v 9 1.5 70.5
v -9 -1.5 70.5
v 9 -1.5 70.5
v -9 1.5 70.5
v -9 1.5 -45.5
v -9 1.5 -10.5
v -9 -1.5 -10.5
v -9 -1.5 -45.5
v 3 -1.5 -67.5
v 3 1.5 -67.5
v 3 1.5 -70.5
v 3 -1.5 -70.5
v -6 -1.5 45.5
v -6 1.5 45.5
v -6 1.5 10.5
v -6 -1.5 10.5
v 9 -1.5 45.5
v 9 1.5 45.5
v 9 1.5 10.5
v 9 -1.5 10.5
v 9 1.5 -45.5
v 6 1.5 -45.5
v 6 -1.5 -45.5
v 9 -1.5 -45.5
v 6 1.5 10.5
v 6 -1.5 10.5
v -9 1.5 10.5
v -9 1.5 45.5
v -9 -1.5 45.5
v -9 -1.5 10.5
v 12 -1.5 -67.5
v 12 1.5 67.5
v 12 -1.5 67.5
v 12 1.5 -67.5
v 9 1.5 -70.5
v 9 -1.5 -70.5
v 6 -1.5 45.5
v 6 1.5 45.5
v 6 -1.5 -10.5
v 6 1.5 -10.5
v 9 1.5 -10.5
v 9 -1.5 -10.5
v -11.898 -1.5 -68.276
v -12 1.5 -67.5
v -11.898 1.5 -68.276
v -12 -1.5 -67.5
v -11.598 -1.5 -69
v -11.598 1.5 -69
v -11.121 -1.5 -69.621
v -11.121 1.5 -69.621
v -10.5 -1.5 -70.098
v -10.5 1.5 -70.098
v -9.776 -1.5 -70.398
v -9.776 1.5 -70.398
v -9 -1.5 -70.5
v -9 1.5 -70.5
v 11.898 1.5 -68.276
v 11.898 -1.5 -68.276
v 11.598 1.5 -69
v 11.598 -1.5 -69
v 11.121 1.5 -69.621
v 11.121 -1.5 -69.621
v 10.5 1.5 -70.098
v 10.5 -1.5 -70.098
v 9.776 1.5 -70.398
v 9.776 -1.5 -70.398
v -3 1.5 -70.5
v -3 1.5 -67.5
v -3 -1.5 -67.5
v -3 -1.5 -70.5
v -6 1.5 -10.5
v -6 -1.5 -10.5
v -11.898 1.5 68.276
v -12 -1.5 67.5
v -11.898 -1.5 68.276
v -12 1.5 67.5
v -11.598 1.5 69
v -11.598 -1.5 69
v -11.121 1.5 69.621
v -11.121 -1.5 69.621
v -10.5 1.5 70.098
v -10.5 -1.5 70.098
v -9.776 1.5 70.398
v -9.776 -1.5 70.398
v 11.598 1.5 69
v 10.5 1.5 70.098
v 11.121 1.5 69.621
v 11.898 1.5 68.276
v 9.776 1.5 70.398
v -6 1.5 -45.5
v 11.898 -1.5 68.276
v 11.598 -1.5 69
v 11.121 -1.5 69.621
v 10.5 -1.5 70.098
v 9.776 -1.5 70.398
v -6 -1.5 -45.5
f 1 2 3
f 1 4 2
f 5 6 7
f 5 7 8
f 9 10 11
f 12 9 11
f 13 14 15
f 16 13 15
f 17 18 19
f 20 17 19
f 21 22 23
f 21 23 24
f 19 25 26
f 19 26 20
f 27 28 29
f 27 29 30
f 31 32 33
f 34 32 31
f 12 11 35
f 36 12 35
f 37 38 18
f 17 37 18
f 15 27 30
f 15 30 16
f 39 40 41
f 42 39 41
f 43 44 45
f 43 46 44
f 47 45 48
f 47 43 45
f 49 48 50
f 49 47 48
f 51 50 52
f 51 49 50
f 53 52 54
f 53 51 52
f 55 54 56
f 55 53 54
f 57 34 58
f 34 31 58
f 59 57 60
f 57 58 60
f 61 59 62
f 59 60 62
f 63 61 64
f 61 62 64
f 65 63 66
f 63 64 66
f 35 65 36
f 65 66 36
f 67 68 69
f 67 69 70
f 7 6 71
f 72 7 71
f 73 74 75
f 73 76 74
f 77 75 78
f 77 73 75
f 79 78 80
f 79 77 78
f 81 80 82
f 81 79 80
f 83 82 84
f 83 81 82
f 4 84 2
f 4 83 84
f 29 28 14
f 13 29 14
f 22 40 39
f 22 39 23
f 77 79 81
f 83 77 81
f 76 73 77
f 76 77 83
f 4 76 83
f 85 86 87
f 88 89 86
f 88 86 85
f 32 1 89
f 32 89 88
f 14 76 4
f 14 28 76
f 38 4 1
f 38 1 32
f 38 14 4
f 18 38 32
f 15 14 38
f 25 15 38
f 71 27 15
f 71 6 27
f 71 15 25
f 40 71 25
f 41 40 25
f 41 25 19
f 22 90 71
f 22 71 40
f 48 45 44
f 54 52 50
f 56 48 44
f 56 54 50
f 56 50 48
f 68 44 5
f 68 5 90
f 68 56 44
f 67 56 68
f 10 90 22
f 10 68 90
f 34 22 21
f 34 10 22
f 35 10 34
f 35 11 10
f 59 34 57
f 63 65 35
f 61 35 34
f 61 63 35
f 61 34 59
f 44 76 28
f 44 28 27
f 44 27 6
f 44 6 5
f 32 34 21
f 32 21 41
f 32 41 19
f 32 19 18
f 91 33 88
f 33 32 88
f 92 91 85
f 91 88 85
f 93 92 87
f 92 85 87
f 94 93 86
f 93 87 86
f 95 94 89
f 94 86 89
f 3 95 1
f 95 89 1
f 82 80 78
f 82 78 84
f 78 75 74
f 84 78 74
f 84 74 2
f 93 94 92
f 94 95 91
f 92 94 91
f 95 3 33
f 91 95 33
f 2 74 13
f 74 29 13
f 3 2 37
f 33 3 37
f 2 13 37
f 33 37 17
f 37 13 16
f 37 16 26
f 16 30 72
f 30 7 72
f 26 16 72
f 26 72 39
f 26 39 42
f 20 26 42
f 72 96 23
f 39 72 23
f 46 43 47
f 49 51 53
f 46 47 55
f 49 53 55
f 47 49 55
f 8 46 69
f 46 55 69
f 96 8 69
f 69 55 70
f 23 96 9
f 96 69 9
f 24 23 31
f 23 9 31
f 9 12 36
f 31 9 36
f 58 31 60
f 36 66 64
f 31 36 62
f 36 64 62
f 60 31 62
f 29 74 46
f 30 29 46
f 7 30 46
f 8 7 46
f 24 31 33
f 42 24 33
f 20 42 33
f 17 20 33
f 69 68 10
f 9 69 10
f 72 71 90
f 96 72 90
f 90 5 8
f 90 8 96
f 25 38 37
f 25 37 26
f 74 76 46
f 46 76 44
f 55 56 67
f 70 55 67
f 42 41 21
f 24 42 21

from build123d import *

# Parameters (mm, degrees)
SKETCH1_W               = 24
SKETCH1_H               = 141
BOSS_EXTRUDE1_DEPTH     = 1.5
SKETCH2_W               = 3
SKETCH2_H               = 35
CUT_EXTRUDE1_DEPTH      = 2.5
CUT_EXTRUDE1_DEPTH_BACK = 2.5
FILLET1_R               = 3
SKETCH3_W               = 6
SKETCH3_H               = 3
CUT_EXTRUDE2_DEPTH      = 2.5
CUT_EXTRUDE2_DEPTH_BACK = 2.5


with BuildPart() as part:
    # Sketch1 → Boss-Extrude1 (new body, symmetric)
    with BuildSketch(Plane(origin=(0, 0, 0), x_dir=(1, 0, 0), z_dir=(0, 1, 0))):
        Rectangle(SKETCH1_W, SKETCH1_H)
    extrude(amount=BOSS_EXTRUDE1_DEPTH, both=True)

    # Sketch2 → Cut-Extrude1 (cut, two sides)
    with BuildSketch(Plane(origin=(0, 0, 0), x_dir=(1, 0, 0), z_dir=(0, 1, 0))) as cut_extrude1_sk:
        with Locations((-7.5, 28)):
            Rectangle(SKETCH2_W, SKETCH2_H)
        with Locations((7.5, 28)):
            Rectangle(SKETCH2_W, SKETCH2_H)
        with Locations((7.5, -28)):
            Rectangle(SKETCH2_W, SKETCH2_H)
        with Locations((-7.5, -28)):
            Rectangle(SKETCH2_W, SKETCH2_H)
    extrude(amount=CUT_EXTRUDE1_DEPTH, mode=Mode.SUBTRACT)
    extrude(cut_extrude1_sk.sketch, amount=-CUT_EXTRUDE1_DEPTH_BACK, mode=Mode.SUBTRACT)

    # Fillet1
    fillet1_edges = [part.edges().sort_by_distance(p)[0] for p in [
        (-12, 0, -70.5),
        (12, 0, -70.5),
        (12, 0, 70.5),
        (-12, 0, 70.5),
    ]]
    fillet(fillet1_edges, radius=FILLET1_R)

    # Sketch3 → Cut-Extrude2 (cut, two sides)
    with BuildSketch(Plane(origin=(0, 0, 0), x_dir=(1, 0, 0), z_dir=(0, 1, 0))) as cut_extrude2_sk:
        with Locations((0, 69)):
            Rectangle(SKETCH3_W, SKETCH3_H)
    extrude(amount=CUT_EXTRUDE2_DEPTH, mode=Mode.SUBTRACT)
    extrude(cut_extrude2_sk.sketch, amount=-CUT_EXTRUDE2_DEPTH_BACK, mode=Mode.SUBTRACT)


solid = part.part
